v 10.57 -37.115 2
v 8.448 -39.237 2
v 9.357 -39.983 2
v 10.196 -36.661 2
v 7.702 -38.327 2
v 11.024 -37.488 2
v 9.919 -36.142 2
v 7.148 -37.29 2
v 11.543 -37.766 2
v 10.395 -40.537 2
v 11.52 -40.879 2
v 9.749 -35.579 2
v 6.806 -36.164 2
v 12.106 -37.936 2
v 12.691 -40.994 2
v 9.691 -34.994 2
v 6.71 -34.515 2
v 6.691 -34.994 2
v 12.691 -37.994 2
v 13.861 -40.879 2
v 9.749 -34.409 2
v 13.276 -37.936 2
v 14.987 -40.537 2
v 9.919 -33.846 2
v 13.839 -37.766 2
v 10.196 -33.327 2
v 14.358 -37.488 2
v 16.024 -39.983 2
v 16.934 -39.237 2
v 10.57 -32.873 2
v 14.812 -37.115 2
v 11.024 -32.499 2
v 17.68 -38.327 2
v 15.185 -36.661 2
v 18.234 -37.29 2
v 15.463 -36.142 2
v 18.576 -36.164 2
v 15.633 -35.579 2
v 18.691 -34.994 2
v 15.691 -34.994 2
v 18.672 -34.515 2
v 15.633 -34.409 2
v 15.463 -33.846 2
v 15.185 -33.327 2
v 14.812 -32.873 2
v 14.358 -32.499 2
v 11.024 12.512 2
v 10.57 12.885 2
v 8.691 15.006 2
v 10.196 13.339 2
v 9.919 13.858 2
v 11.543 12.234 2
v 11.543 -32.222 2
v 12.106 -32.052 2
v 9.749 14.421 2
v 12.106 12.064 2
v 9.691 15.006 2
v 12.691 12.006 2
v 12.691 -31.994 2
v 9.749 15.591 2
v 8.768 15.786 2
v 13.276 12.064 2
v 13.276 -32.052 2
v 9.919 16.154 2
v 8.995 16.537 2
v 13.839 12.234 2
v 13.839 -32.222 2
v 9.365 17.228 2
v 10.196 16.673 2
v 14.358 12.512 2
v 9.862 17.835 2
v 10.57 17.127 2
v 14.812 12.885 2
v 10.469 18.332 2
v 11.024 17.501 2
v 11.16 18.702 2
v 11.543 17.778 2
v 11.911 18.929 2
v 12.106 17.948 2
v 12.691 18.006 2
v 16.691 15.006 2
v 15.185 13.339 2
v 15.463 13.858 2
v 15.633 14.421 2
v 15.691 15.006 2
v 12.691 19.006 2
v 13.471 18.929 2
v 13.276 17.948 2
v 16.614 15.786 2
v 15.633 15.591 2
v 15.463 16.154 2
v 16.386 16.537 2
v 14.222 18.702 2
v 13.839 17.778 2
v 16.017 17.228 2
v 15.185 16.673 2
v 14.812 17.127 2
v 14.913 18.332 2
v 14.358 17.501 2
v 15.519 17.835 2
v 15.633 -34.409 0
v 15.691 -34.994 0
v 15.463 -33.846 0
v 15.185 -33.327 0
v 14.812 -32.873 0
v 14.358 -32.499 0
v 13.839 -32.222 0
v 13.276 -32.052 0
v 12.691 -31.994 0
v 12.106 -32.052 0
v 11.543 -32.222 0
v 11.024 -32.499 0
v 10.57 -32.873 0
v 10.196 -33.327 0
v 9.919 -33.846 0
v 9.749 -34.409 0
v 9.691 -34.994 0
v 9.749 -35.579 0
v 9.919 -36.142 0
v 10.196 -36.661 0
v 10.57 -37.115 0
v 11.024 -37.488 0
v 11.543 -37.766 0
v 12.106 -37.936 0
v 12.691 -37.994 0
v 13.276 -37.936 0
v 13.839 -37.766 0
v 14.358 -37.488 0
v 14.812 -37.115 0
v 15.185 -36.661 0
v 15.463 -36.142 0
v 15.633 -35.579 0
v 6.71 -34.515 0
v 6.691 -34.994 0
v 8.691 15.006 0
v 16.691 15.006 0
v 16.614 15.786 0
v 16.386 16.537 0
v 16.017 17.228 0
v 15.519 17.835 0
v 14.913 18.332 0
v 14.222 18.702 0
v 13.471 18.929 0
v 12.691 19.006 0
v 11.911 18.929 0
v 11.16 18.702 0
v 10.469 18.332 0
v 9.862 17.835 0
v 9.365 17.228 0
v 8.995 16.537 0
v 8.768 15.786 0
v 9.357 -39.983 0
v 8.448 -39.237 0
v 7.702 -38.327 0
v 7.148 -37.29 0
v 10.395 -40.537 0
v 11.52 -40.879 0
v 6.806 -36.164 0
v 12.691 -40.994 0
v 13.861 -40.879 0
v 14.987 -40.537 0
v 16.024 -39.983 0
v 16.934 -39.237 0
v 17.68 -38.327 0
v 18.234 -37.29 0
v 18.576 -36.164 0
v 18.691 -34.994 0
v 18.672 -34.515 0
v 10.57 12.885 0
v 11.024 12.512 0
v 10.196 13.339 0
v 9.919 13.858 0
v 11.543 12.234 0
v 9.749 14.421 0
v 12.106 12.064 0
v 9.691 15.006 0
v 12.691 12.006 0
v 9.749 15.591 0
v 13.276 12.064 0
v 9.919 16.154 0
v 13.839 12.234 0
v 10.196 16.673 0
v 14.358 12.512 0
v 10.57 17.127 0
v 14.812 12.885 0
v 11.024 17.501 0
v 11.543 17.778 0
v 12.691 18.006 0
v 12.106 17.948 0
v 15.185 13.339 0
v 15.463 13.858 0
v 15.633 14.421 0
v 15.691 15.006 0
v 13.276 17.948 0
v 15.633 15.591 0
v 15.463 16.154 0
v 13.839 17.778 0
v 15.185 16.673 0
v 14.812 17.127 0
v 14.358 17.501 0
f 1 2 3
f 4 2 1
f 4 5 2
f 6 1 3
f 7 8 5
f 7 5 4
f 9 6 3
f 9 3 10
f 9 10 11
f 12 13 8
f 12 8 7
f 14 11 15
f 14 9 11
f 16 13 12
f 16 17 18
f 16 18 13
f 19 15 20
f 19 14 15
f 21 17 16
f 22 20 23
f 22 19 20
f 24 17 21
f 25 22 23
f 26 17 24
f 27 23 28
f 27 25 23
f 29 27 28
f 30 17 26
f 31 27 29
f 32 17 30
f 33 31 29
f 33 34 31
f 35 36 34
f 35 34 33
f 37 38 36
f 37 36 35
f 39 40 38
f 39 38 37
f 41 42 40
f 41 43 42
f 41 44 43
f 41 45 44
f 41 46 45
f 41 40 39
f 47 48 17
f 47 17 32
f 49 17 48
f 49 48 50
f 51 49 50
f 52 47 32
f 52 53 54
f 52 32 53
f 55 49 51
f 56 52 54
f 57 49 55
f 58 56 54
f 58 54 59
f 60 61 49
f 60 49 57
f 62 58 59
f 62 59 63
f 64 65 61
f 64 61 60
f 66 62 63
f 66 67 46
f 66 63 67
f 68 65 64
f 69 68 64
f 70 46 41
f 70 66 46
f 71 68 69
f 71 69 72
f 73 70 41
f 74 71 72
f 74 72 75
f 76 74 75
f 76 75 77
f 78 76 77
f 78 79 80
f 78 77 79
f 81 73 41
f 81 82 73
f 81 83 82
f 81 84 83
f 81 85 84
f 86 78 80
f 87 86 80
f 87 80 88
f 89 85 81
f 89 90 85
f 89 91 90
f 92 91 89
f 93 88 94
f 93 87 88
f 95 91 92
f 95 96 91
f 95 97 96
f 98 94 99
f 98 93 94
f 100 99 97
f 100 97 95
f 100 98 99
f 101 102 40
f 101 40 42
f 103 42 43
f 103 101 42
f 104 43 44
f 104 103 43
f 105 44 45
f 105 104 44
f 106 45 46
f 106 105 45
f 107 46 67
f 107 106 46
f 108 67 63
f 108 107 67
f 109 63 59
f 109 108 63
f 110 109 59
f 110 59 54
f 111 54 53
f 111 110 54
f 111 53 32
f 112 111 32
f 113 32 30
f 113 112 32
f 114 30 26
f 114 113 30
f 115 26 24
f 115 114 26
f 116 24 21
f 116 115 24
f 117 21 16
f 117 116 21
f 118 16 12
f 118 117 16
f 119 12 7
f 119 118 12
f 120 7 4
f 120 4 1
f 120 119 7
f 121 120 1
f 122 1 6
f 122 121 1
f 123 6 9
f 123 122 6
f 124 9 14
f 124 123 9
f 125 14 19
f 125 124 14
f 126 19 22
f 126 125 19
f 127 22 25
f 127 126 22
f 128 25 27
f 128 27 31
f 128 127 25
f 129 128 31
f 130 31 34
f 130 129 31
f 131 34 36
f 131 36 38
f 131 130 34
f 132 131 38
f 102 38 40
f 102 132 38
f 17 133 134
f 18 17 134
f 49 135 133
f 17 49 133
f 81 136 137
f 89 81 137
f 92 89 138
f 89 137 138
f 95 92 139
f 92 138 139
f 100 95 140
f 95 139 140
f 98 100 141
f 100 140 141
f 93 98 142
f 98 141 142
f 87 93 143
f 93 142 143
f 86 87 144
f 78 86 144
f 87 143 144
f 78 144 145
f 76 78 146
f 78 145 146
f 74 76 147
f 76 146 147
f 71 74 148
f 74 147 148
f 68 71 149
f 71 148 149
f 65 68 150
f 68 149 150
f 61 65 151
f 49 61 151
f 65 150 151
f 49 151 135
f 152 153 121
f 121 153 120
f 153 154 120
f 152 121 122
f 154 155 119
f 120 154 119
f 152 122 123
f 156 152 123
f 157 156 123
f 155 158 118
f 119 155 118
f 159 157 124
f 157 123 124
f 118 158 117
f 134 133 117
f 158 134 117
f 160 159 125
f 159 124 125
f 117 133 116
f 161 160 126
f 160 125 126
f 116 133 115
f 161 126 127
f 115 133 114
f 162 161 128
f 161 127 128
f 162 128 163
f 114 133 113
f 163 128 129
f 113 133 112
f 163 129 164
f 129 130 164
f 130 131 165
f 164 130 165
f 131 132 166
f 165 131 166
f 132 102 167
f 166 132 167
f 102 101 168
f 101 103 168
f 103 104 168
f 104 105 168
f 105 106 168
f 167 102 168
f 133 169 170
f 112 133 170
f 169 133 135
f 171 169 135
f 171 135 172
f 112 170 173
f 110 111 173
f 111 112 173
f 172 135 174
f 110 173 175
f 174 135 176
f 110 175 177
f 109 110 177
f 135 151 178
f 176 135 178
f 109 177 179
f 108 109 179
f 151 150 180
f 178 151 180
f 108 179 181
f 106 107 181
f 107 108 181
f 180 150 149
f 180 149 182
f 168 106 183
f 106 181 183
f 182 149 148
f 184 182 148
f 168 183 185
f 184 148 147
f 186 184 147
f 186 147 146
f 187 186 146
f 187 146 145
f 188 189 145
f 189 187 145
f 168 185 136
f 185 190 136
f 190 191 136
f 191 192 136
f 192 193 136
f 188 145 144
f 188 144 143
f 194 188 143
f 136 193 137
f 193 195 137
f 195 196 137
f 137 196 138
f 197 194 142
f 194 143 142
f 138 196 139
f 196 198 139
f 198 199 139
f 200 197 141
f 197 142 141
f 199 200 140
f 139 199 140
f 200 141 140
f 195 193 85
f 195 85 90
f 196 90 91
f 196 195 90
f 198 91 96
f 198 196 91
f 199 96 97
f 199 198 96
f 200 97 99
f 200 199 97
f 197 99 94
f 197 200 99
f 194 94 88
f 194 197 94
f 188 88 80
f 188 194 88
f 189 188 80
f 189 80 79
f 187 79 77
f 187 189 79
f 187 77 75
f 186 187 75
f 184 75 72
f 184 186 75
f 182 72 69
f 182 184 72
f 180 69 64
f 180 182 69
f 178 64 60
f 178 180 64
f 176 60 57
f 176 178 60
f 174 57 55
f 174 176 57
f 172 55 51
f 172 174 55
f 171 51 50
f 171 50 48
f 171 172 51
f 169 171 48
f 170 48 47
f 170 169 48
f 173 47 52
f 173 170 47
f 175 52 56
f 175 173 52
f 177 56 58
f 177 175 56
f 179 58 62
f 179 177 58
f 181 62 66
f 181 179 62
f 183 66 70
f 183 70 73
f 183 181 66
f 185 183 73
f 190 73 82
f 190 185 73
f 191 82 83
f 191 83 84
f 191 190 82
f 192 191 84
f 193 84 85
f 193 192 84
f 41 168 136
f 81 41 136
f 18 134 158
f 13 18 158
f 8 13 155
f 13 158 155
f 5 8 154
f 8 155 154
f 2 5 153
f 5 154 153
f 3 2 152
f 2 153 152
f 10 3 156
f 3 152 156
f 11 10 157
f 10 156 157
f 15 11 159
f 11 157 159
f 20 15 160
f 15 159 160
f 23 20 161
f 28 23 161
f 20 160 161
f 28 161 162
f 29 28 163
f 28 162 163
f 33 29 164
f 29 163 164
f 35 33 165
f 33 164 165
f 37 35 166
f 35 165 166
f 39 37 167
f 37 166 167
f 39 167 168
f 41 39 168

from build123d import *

# Parameters (mm, degrees)
SZKIC1_R                    = 3
DODANIE_WYCI_GNI_CIE1_DEPTH = 2


with BuildPart() as part:
    # Szkic1 → Dodanie-wyciągnięcie1 (new body)
    with BuildSketch(Plane.XY):
        with BuildLine():
            ThreePointArc((16.690895301, 15.0061262), (12.690895301, 19.0061262), (8.690895301, 15.0061262))
            Line((8.690895301, 15.0061262), (6.71006463, -34.514640573))
            Line((6.71006463, -34.514640573), (6.690895301, -34.9938738))
            ThreePointArc((6.690895301, -34.9938738), (12.690895301, -40.9938738), (18.690895301, -34.9938738))
            Line((18.690895301, -34.9938738), (18.671725971, -34.514640573))
            Line((18.671725971, -34.514640573), (16.690895301, 15.0061262))
        make_face()
        with Locations((12.690895301, -34.9938738)):
            Circle(SZKIC1_R, mode=Mode.SUBTRACT)
        with Locations((12.690895301, 15.0061262)):
            Circle(SZKIC1_R, mode=Mode.SUBTRACT)
    extrude(amount=DODANIE_WYCI_GNI_CIE1_DEPTH)


solid = part.part
